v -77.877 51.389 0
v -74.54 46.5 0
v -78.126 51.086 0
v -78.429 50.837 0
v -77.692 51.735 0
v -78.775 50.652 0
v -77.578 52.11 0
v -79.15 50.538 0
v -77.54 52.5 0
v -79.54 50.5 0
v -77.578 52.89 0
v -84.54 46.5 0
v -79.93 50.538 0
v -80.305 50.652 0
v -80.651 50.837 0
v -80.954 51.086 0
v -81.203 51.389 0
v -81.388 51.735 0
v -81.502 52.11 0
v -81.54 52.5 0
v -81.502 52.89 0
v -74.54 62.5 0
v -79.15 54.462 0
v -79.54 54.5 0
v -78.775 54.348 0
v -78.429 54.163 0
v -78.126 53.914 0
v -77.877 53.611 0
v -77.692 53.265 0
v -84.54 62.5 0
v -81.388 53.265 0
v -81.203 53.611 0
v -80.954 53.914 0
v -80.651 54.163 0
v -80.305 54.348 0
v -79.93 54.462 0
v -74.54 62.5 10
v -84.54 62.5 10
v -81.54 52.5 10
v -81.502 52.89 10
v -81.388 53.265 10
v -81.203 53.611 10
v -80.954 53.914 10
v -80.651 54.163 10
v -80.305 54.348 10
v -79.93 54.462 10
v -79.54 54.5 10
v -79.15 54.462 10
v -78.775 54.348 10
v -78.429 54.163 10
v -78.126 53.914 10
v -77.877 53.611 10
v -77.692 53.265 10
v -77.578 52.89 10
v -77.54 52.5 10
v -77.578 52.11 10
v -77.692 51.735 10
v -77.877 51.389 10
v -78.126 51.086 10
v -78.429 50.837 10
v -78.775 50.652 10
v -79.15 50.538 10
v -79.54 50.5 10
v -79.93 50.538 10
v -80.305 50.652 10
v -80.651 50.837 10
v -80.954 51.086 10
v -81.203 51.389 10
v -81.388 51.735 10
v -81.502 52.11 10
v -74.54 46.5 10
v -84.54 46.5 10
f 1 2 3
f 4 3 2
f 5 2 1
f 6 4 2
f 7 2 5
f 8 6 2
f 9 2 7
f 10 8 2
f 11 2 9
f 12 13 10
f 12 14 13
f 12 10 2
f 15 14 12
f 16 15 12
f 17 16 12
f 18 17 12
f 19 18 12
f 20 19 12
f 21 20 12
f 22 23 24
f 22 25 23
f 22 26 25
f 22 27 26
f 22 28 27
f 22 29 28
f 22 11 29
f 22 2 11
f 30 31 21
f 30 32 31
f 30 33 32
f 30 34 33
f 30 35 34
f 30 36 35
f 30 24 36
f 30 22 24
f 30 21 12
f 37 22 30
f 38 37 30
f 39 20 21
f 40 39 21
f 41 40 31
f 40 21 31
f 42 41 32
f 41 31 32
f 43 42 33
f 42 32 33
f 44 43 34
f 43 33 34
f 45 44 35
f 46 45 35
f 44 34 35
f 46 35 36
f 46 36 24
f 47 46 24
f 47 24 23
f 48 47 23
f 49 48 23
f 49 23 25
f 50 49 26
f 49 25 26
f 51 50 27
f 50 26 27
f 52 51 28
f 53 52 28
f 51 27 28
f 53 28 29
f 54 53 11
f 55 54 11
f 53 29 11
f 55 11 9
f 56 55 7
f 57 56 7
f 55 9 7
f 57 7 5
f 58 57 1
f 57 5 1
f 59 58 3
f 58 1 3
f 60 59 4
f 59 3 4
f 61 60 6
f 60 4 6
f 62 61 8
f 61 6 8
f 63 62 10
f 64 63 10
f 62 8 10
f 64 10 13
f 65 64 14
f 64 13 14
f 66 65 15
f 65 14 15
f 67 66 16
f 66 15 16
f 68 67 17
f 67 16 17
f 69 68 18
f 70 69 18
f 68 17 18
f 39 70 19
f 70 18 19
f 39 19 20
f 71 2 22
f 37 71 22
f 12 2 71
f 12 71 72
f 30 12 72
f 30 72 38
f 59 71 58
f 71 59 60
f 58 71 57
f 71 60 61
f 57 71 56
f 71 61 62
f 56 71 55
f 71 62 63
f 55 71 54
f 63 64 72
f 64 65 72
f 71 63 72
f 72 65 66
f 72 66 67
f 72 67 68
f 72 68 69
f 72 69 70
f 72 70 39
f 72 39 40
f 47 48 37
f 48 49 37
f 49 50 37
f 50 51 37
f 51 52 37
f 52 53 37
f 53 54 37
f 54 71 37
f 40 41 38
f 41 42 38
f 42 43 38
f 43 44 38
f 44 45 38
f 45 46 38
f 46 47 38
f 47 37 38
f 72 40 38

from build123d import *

# Parameters (mm, degrees)
SKETCH1_W           = 10
SKETCH1_H           = 16
SKETCH1_R           = 2
BOSS_EXTRUDE1_DEPTH = 10


with BuildPart() as part:
    # Sketch1 → Boss-Extrude1 (new body)
    with BuildSketch(Plane(origin=(0, 0, 0), x_dir=(-1.0, 0, 8.723016310561762e-12), z_dir=(-8.723016310561762e-12, 5.3094256425393756e-15, -1.0))):
        with Locations((79.539990831, 54.5)):
            Rectangle(SKETCH1_W, SKETCH1_H)
        with Locations((79.539990831, 52.5)):
            Circle(SKETCH1_R, mode=Mode.SUBTRACT)
    extrude(amount=-BOSS_EXTRUDE1_DEPTH)


solid = part.part
